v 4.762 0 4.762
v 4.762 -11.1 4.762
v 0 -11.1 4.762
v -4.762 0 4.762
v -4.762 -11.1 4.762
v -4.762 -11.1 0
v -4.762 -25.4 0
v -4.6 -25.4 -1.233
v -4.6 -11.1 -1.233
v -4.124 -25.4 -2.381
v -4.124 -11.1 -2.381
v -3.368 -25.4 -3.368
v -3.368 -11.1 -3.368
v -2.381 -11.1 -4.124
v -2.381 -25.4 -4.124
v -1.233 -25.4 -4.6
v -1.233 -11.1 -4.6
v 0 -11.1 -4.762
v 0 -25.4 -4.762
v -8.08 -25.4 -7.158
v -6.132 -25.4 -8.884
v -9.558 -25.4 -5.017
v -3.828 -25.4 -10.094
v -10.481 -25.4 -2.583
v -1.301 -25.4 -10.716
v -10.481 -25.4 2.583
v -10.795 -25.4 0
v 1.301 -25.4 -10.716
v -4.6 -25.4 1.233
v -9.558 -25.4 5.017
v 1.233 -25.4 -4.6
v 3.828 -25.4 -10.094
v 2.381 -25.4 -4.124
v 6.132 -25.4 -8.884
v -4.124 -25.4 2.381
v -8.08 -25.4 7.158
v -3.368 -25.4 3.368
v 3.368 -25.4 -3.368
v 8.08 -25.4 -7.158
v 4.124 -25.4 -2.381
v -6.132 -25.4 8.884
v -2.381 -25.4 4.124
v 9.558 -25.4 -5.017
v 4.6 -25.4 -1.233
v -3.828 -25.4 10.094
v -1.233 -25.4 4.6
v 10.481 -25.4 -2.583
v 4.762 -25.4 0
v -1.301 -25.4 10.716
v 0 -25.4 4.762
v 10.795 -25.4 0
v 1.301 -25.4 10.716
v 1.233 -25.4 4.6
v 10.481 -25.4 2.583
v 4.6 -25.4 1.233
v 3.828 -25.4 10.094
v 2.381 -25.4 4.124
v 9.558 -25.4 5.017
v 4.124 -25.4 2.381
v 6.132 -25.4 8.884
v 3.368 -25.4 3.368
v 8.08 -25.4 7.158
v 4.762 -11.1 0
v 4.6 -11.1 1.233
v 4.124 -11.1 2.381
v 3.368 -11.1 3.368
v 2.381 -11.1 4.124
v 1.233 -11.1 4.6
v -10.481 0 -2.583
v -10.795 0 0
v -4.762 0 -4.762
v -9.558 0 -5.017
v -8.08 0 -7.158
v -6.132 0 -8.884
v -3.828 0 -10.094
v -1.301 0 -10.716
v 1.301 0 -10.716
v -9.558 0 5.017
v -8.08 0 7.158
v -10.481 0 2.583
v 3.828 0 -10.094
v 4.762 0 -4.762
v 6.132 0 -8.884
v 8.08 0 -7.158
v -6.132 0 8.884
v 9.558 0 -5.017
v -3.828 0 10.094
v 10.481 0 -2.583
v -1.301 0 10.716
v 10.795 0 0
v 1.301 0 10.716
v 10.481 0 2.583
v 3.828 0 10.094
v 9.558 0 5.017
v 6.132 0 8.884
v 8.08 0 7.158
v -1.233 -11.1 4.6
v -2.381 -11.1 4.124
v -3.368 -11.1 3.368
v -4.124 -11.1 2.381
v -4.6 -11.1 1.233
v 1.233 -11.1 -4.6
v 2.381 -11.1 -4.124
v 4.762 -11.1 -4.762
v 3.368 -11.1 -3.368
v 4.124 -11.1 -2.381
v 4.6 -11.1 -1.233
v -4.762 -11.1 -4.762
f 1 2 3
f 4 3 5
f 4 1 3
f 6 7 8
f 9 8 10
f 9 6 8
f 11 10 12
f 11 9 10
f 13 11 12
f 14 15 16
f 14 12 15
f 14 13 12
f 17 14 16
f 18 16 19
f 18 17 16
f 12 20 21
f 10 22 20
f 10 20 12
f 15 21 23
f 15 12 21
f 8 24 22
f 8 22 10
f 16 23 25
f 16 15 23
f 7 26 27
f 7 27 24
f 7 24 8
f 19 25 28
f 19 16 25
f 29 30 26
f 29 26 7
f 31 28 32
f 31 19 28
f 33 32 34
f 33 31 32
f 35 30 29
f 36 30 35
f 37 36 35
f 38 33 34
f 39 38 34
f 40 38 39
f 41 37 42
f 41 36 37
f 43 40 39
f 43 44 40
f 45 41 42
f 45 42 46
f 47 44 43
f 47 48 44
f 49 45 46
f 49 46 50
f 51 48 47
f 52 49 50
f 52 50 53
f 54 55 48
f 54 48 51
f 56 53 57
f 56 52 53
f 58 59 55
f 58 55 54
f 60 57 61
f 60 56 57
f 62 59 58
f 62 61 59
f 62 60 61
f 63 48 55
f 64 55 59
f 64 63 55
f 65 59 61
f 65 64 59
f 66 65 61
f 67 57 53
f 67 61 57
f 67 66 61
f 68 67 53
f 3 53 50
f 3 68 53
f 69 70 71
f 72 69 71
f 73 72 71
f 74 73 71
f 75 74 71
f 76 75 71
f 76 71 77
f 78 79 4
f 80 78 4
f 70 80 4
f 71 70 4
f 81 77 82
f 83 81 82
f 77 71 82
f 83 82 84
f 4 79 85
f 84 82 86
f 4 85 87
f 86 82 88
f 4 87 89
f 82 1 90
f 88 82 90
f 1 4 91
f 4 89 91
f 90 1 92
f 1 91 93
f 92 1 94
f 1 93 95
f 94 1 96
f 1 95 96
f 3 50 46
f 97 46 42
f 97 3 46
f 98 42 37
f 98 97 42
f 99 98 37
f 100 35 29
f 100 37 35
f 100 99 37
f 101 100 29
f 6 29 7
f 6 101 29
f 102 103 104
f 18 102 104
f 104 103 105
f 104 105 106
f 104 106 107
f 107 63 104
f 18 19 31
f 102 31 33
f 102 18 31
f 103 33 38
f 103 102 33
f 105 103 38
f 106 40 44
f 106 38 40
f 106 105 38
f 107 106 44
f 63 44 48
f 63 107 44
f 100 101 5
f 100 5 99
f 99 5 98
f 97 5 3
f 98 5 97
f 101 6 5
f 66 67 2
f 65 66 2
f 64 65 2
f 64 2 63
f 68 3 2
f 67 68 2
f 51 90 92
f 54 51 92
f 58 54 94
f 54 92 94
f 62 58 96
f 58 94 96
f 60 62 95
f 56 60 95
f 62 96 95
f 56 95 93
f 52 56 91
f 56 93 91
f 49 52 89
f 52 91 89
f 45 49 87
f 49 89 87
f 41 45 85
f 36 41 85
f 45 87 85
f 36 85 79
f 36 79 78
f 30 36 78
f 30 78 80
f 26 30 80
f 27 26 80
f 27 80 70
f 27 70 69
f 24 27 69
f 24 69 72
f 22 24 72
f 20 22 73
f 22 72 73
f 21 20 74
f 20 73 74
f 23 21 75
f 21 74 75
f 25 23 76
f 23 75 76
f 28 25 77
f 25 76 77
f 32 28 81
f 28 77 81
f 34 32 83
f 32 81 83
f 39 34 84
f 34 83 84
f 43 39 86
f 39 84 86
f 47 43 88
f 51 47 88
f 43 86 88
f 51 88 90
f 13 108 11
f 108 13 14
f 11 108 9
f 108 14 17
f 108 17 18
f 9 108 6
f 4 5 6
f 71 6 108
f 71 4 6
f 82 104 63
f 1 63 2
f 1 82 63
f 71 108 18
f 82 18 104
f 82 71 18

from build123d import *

# Parameters (mm, degrees)
F0_R     = 10.795
F1_DEPTH = 25.4
F3_DEPTH = 25.401
F4_DEPTH = 11.0998


with BuildPart() as f1:
    # F0 (on Front) → F1 (new body)
    with BuildSketch(Plane.XZ):
        Circle(F0_R)
    extrude(amount=F1_DEPTH)

    # F2 (on Front) → F3 (cut, through all)
    with BuildSketch(Plane.XZ):
        with BuildLine():
            ThreePointArc((4.7625, 0), (3.367596, 3.367596), (0, 4.7625))
            ThreePointArc((0, 4.7625), (-3.367596, 3.367596), (-4.7625, 0))
            ThreePointArc((-4.7625, 0), (-3.367596, -3.367596), (0, -4.7625))
            ThreePointArc((0, -4.7625), (3.367596, -3.367596), (4.7625, 0))
        make_face()
    extrude(amount=F3_DEPTH, mode=Mode.SUBTRACT)

    # F2 (on Front) → F4 (cut)
    with BuildSketch(Plane.XZ):
        with BuildLine():
            Line((4.7625, 0), (4.7625, 4.7625))
            Line((4.7625, 4.7625), (0, 4.7625))
            ThreePointArc((0, 4.7625), (3.367596, 3.367596), (4.7625, 0))
        make_face()
        with BuildLine():
            ThreePointArc((-4.7625, 0), (-3.367596, 3.367596), (0, 4.7625))
            Line((0, 4.7625), (-4.7625, 4.7625))
            Line((-4.7625, 4.7625), (-4.7625, 0))
        make_face()
        with BuildLine():
            Line((4.7625, -4.7625), (4.7625, 0))
            ThreePointArc((4.7625, 0), (3.367596, -3.367596), (0, -4.7625))
            Line((0, -4.7625), (4.7625, -4.7625))
        make_face()
        with BuildLine():
            ThreePointArc((0, -4.7625), (-3.367596, -3.367596), (-4.7625, 0))
            Line((-4.7625, 0), (-4.7625, -4.7625))
            Line((-4.7625, -4.7625), (0, -4.7625))
        make_face()
    extrude(amount=F4_DEPTH, mode=Mode.SUBTRACT)


solid = f1.part
